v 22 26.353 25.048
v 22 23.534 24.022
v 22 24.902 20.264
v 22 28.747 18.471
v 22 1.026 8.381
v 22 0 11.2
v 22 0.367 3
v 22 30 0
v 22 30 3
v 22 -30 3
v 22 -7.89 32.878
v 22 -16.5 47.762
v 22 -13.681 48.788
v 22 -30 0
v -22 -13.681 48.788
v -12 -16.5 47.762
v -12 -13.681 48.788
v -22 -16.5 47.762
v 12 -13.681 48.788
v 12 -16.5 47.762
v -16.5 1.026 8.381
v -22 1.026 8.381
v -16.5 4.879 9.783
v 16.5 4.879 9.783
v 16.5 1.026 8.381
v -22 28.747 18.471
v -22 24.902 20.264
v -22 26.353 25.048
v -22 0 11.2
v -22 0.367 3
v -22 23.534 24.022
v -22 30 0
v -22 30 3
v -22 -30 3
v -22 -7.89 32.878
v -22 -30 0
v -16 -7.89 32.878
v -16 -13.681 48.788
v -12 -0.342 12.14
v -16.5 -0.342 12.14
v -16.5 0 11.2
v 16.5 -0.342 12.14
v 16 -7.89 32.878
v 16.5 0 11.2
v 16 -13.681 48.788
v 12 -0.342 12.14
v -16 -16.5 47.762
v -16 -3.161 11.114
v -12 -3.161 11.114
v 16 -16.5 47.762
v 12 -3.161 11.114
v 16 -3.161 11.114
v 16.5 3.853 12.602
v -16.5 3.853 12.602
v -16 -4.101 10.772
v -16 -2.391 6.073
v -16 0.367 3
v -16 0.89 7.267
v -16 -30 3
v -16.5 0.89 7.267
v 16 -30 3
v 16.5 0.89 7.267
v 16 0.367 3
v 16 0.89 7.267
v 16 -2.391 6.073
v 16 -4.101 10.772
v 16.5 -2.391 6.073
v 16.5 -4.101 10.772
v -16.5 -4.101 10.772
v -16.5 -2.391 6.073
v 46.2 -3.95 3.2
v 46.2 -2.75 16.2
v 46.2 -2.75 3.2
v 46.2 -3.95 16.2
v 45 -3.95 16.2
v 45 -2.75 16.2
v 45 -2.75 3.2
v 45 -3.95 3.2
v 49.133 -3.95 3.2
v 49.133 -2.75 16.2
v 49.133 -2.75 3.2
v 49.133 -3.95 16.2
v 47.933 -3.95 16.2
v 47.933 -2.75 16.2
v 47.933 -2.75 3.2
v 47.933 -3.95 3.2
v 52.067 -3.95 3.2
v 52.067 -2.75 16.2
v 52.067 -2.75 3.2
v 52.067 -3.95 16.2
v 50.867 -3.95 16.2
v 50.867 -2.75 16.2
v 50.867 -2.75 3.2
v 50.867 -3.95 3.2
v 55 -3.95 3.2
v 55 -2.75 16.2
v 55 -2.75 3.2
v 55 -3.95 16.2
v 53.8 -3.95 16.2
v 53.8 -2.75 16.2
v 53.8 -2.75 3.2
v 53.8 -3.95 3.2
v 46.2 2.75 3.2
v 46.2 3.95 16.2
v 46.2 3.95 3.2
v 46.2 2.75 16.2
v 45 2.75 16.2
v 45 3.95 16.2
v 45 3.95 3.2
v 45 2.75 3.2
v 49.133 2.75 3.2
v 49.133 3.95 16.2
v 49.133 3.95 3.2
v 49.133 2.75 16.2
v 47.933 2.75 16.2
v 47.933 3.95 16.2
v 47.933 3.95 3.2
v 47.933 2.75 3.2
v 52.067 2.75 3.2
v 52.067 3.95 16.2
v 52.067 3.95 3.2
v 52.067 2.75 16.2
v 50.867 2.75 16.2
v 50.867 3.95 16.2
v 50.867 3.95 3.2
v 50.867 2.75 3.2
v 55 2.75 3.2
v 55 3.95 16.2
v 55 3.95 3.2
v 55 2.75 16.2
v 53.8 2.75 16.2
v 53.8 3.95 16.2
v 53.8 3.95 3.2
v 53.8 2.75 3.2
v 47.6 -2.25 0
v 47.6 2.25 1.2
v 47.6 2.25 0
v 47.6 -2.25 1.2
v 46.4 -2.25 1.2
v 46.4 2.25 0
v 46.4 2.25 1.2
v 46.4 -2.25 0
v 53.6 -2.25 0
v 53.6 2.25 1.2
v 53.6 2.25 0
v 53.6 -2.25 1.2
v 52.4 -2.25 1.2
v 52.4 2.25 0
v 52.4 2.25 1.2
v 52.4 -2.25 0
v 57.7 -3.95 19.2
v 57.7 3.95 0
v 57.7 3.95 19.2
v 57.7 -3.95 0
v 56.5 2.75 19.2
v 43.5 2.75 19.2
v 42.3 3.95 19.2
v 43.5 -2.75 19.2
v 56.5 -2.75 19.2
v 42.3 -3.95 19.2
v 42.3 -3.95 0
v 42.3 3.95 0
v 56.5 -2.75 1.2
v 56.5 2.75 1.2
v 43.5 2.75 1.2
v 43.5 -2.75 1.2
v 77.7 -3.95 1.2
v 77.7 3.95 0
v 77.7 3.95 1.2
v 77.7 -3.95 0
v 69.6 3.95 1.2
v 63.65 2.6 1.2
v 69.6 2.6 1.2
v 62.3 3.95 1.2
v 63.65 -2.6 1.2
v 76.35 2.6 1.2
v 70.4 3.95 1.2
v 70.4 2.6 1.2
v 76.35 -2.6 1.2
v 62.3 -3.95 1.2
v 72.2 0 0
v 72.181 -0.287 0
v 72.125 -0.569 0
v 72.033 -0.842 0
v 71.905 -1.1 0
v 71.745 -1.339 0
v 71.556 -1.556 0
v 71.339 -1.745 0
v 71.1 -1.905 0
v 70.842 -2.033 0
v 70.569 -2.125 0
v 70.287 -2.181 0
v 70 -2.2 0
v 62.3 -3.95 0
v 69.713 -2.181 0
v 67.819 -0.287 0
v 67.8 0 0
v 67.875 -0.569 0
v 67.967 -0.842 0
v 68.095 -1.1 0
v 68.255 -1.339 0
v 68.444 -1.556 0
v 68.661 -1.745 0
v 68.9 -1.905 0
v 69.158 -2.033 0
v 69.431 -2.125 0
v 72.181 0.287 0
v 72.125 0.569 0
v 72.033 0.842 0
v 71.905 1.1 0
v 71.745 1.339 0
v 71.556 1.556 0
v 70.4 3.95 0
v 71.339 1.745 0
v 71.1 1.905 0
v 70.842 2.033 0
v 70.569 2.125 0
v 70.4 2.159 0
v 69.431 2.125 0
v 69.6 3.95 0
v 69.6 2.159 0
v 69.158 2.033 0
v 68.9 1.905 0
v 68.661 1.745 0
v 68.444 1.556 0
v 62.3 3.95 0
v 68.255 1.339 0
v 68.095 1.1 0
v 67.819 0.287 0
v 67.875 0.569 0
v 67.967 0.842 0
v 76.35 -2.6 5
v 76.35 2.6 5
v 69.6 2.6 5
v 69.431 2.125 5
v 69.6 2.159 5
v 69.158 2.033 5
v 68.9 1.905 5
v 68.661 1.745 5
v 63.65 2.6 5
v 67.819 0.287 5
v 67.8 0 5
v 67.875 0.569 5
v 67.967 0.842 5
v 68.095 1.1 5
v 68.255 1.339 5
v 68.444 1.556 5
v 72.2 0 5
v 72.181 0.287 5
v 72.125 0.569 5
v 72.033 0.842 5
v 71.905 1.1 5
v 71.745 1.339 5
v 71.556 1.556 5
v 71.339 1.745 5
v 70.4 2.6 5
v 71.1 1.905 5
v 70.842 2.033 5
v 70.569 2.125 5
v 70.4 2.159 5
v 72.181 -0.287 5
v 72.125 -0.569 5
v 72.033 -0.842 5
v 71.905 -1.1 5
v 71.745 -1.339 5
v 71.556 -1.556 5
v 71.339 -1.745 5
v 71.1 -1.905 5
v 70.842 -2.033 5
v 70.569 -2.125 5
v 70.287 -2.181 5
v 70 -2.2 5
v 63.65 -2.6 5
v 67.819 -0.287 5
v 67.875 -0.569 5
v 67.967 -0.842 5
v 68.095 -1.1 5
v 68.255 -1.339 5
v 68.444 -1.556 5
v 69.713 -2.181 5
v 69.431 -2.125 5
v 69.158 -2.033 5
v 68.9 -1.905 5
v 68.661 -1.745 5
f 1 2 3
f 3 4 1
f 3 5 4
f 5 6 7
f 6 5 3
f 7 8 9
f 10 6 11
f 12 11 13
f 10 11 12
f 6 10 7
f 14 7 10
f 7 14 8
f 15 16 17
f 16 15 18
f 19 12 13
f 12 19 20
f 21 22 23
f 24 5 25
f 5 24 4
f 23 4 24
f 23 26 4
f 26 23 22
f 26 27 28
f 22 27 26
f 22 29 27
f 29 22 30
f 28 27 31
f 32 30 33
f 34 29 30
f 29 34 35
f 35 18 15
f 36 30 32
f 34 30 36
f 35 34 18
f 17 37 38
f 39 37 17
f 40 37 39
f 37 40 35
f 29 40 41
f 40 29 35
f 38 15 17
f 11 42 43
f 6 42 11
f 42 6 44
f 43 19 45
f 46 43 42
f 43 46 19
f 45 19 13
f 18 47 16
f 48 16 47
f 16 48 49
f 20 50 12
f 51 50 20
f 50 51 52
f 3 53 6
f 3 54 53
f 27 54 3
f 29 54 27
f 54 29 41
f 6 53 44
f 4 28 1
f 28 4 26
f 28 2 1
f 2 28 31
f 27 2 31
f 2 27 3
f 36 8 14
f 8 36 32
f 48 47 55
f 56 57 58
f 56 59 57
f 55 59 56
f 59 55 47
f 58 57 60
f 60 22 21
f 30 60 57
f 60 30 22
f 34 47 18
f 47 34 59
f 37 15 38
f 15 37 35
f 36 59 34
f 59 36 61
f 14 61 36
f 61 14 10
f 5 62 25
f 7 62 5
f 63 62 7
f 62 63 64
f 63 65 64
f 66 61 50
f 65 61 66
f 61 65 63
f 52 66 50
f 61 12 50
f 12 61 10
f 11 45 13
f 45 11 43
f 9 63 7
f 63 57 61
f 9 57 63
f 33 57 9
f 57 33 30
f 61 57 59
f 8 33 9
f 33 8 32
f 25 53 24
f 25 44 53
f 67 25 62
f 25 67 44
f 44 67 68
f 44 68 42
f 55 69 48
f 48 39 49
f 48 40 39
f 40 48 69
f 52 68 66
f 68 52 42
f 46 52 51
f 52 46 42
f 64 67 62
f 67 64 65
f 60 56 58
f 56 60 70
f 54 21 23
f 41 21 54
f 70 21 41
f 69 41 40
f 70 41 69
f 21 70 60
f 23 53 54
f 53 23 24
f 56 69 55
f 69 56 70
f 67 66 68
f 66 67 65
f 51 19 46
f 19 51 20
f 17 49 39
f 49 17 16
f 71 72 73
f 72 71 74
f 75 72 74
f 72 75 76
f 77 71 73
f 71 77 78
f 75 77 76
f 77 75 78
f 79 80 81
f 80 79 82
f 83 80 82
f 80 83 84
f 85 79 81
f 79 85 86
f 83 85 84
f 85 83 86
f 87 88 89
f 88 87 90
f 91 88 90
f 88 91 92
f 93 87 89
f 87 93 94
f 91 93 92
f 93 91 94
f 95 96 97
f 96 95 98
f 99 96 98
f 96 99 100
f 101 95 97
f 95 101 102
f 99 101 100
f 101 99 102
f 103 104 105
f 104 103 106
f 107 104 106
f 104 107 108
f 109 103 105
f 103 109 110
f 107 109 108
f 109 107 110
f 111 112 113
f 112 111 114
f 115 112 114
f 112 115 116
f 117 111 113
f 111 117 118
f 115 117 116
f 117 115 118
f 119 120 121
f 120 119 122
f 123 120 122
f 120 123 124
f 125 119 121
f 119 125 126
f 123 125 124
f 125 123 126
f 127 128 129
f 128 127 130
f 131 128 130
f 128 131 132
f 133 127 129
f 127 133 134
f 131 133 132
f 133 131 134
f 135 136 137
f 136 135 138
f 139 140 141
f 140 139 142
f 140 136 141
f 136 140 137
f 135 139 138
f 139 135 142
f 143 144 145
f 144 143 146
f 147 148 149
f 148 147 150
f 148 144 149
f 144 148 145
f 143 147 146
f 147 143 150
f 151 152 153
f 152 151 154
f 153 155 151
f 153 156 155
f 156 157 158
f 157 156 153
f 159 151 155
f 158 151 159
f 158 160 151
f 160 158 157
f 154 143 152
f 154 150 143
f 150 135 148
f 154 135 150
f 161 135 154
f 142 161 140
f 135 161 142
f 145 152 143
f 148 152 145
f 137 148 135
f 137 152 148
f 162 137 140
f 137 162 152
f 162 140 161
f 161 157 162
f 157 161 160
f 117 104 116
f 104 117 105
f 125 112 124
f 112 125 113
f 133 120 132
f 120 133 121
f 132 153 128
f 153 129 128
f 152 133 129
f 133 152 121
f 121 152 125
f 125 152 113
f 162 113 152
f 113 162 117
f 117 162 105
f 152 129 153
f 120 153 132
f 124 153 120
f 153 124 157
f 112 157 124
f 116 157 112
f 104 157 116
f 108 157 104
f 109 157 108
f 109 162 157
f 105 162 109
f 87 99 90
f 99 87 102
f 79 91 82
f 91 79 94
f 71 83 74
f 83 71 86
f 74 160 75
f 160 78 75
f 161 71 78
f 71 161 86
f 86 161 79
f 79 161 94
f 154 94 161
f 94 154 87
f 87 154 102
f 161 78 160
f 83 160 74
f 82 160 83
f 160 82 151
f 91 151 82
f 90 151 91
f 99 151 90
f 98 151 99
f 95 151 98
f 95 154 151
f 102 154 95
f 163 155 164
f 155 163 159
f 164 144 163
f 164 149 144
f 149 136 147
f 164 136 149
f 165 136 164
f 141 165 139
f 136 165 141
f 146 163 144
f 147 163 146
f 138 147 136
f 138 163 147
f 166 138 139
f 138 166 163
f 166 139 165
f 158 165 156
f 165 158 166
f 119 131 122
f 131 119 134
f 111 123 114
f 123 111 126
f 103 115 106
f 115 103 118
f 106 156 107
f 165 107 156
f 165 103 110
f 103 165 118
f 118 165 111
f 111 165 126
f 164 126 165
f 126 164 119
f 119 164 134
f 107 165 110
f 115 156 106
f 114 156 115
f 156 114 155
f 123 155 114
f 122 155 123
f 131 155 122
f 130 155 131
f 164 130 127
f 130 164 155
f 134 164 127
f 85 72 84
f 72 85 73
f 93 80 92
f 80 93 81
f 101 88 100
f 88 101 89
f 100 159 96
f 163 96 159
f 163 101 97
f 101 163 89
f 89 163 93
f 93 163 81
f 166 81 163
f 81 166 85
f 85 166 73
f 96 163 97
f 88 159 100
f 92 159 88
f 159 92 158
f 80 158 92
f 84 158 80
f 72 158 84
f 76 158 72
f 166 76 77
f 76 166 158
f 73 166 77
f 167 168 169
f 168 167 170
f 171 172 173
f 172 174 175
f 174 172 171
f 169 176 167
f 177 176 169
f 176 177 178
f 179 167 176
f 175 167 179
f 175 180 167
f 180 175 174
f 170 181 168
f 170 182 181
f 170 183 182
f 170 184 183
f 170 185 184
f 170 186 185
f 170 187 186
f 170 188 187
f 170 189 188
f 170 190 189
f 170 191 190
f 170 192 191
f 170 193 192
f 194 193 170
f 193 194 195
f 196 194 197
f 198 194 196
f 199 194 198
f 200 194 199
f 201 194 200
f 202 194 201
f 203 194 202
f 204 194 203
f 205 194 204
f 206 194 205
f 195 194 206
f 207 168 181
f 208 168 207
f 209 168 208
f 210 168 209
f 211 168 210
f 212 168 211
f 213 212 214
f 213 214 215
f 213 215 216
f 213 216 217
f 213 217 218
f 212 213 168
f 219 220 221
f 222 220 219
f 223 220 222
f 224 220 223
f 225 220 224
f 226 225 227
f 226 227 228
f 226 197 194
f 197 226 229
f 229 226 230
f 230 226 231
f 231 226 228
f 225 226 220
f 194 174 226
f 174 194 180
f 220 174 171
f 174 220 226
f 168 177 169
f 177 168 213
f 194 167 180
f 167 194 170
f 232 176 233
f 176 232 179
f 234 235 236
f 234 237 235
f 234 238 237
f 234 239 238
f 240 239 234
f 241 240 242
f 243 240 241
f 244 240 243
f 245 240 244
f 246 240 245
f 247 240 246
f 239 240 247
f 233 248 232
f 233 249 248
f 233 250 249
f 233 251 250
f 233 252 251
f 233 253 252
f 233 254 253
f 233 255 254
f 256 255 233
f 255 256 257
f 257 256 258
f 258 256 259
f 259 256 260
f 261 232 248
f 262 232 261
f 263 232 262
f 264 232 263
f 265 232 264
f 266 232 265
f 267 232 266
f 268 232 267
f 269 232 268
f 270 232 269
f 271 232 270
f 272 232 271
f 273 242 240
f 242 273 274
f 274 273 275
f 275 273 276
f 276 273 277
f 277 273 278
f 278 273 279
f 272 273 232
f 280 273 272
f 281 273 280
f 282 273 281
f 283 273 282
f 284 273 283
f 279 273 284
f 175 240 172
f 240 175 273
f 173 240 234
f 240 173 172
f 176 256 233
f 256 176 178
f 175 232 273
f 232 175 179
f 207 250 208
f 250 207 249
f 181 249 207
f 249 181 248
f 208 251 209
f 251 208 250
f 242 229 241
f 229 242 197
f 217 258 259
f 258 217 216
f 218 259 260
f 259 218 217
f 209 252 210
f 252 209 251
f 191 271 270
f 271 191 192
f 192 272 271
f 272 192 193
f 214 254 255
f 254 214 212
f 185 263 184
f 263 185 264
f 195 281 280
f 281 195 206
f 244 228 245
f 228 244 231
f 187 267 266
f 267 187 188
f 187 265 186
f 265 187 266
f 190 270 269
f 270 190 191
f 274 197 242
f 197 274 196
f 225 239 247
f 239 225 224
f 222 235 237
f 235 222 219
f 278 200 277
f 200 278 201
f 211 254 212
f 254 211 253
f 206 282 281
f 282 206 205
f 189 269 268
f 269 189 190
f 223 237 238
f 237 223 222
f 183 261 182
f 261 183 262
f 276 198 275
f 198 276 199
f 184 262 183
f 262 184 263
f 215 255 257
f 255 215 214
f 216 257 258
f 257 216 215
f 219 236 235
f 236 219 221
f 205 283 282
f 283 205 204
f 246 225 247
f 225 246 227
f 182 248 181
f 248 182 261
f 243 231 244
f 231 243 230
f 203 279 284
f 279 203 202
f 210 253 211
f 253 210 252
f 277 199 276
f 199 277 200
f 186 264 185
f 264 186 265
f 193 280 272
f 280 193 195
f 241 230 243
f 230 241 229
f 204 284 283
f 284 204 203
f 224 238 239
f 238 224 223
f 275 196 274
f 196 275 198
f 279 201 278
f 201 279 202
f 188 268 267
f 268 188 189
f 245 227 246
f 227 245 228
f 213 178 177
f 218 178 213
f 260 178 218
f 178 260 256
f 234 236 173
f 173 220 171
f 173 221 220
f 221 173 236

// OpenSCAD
/*
 * Watch V1 - printed accessories
 *
 *   desk_stand   - holds the watch upright on a desk or a music-stand ledge, so a
 *                  class can see the timer / countdown / metronome. The strap stays on.
 *   probe_sleeve - vented case for a sensor board on a cable (the bee kit's hive probe)
 *   probe_plug   - closes the sleeve's open end round the cable
 *
 * Export:  openscad -D 'part="desk_stand"' -o stl/desk_stand.stl accessories.scad
 * No supports needed: print the stand lying on one of its side cheeks, the sleeve
 * standing on its closed end, the plug flat. PETG or PLA, 0.2 mm layers.
 */

part = "all";   // [all, desk_stand, probe_sleeve, probe_plug]

/* [Watch - must match enclosure.scad] */
watch = [62.8, 48.8, 25.3];   // outer x (long), y (short, strap direction), height
lug = [31, 6.2, 3.5];         // strap lug width, how far it sticks out, height (at the base)
strap = [24, 2.5];            // strap width + clearance, thickness

/* [Desk stand] */
tilt = 70;                    // degrees from horizontal
stand_w = 44;                 // width of the stand (the watch overhangs it on both sides)
fit = 0.6;                    // clearance round the watch
ledge = 4;                    // how far the front lip comes up the watch face

/* [Probe sleeve: sensor board on a cable] */
board = [12, 16, 4];          // breakout board incl. parts (GY-BME280 is about 11.5 x 15.5)
sleeve_wall = 1.2;
cable_d = 4.0;                // 4-core cable
vent_w = 1.2;                 // slot width: small enough that bees cannot get in

$fn = 48;

// ----------------------------------------------------------------- desk stand
// The watch lies with its base against a tilted back and its lower long edge in a
// trough. The lower strap lug and the strap hang down through a slot in the trough.
module desk_stand() {
    t = watch[2] + 2 * fit;        // trough width = watch thickness
    back = 3;
    depth = 60;                    // footprint front-to-back
    lift = 3 + lug[1] + 2;         // raises the trough so the lower lug clears the base plate
    cheek = 6;                     // the braces are two side cheeks, leaving the middle free for the strap
    module cradle() { translate([0, 0, lift]) rotate([90 - tilt, 0, 0]) children(); }
    difference() {
        union() {
            translate([-stand_w / 2, -depth / 2, 0]) cube([stand_w, depth, 3]);              // base plate
            cradle() translate([-stand_w / 2, 0, 0]) {
                translate([0, -back, -back]) cube([stand_w, back, 40 + back]);              // back
                translate([0, -back, -back]) cube([stand_w, t + 2 * back, back]);           // trough floor
                translate([0, t, -back]) cube([stand_w, back, ledge + back]);               // front lip
            }
            for (x = [-stand_w / 2, stand_w / 2 - cheek]) hull() {                          // side cheeks
                translate([x, -depth / 2, 0]) cube([cheek, depth / 2, 3]);
                cradle() translate([x, -back, -back]) cube([cheek, back, 40 + back]);     // behind the back only
            }
        }
        cradle() {
            // the lower lug drops through the trough floor
            translate([-(lug[0] + 2) / 2, -back - 1, -back - 1]) cube([lug[0] + 2, back + lug[2] + fit + 1, back + 2]);
            // window in the back for a one-piece strap that runs behind the case
            translate([-strap[0] / 2, -back - 1, -back - 1]) cube([strap[0], back + 1 + strap[1], 46]);
        }
        translate([-100, -100, -50]) cube([200, 200, 50]);                                 // nothing below the table
    }
}

// ----------------------------------------------------------------- hive probe
// A box with slotted sides round the sensor board. Slide the board in, cable last,
// then press the plug in round the cable.
inside = [board[0] + 1, board[2] + 1.5, board[1] + 2];       // x, y, z (board stands on end)
outside = [inside[0] + 2 * sleeve_wall, inside[1] + 2 * sleeve_wall, inside[2] + sleeve_wall];

module probe_sleeve() {
    difference() {
        translate([-outside[0] / 2, -outside[1] / 2, 0]) cube(outside);
        translate([-inside[0] / 2, -inside[1] / 2, sleeve_wall]) cube([inside[0], inside[1], inside[2] + 1]);
        // vents on the two wide faces
        for (s = [-1, 1], k = [0 : 3])
            translate([-inside[0] / 2 + 1.5 + k * (inside[0] - 3 - vent_w) / 3, s * outside[1] / 2 - 2, sleeve_wall + 2])
                cube([vent_w, 4, inside[2] - 5]);
        // and in the closed end
        for (k = [-1, 1]) translate([k * 3 - vent_w / 2, -inside[1] / 2 + 0.5, -1]) cube([vent_w, inside[1] - 1, sleeve_wall + 2]);
    }
}

module probe_plug() {
    plug_h = 5;
    difference() {
        union() {
            translate([-outside[0] / 2, -outside[1] / 2, 0]) cube([outside[0], outside[1], sleeve_wall]);
            translate([-(inside[0] - 0.3) / 2, -(inside[1] - 0.3) / 2, 0]) cube([inside[0] - 0.3, inside[1] - 0.3, plug_h]);
        }
        translate([0, 0, -1]) cylinder(d = cable_d + 0.4, h = plug_h + 2);
        // split so it can go round a cable that is already soldered
        translate([-0.4, 0, -1]) cube([0.8, outside[1], plug_h + 2]);
    }
}

if (part == "desk_stand") desk_stand();
else if (part == "probe_sleeve") probe_sleeve();
else if (part == "probe_plug") probe_plug();
else {
    desk_stand();
    translate([50, 0, 0]) probe_sleeve();
    translate([70, 0, 0]) probe_plug();
}
